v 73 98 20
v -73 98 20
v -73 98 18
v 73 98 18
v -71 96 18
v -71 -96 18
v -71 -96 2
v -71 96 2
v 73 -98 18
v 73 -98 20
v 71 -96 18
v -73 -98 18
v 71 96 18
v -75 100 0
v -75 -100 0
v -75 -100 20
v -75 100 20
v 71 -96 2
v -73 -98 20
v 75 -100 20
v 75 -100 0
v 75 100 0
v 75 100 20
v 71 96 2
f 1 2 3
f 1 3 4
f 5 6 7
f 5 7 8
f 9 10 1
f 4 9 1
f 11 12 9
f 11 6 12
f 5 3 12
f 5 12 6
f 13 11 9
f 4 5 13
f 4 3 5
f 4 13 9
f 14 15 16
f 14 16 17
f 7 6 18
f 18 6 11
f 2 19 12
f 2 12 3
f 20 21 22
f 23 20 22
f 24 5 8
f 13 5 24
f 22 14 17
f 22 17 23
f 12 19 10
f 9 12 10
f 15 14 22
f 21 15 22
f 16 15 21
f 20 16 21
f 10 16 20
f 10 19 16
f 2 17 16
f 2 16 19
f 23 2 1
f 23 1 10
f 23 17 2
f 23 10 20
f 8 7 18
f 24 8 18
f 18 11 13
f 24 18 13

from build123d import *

# Parameters (mm, degrees)
SKETCH_W        = 150
SKETCH_H        = 200
PAD_DEPTH       = 20
SKETCH001_W     = 146
SKETCH001_H     = 196
POCKET_DEPTH    = 2
SKETCH002_W     = 142
SKETCH002_H     = 192
POCKET001_DEPTH = 18


with BuildPart() as part:
    # Sketch → Pad (new body)
    with BuildSketch(Plane.XY):
        Rectangle(SKETCH_W, SKETCH_H)
    extrude(amount=PAD_DEPTH)

    # Sketch001 → Pocket (cut)
    with BuildSketch(Plane.XY.offset(20)):
        Rectangle(SKETCH001_W, SKETCH001_H)
    extrude(amount=-POCKET_DEPTH, mode=Mode.SUBTRACT)

    # Sketch002 → Pocket001 (cut)
    with BuildSketch(Plane.XY.offset(20)):
        Rectangle(SKETCH002_W, SKETCH002_H)
    extrude(amount=-POCKET001_DEPTH, mode=Mode.SUBTRACT)


solid = part.part
